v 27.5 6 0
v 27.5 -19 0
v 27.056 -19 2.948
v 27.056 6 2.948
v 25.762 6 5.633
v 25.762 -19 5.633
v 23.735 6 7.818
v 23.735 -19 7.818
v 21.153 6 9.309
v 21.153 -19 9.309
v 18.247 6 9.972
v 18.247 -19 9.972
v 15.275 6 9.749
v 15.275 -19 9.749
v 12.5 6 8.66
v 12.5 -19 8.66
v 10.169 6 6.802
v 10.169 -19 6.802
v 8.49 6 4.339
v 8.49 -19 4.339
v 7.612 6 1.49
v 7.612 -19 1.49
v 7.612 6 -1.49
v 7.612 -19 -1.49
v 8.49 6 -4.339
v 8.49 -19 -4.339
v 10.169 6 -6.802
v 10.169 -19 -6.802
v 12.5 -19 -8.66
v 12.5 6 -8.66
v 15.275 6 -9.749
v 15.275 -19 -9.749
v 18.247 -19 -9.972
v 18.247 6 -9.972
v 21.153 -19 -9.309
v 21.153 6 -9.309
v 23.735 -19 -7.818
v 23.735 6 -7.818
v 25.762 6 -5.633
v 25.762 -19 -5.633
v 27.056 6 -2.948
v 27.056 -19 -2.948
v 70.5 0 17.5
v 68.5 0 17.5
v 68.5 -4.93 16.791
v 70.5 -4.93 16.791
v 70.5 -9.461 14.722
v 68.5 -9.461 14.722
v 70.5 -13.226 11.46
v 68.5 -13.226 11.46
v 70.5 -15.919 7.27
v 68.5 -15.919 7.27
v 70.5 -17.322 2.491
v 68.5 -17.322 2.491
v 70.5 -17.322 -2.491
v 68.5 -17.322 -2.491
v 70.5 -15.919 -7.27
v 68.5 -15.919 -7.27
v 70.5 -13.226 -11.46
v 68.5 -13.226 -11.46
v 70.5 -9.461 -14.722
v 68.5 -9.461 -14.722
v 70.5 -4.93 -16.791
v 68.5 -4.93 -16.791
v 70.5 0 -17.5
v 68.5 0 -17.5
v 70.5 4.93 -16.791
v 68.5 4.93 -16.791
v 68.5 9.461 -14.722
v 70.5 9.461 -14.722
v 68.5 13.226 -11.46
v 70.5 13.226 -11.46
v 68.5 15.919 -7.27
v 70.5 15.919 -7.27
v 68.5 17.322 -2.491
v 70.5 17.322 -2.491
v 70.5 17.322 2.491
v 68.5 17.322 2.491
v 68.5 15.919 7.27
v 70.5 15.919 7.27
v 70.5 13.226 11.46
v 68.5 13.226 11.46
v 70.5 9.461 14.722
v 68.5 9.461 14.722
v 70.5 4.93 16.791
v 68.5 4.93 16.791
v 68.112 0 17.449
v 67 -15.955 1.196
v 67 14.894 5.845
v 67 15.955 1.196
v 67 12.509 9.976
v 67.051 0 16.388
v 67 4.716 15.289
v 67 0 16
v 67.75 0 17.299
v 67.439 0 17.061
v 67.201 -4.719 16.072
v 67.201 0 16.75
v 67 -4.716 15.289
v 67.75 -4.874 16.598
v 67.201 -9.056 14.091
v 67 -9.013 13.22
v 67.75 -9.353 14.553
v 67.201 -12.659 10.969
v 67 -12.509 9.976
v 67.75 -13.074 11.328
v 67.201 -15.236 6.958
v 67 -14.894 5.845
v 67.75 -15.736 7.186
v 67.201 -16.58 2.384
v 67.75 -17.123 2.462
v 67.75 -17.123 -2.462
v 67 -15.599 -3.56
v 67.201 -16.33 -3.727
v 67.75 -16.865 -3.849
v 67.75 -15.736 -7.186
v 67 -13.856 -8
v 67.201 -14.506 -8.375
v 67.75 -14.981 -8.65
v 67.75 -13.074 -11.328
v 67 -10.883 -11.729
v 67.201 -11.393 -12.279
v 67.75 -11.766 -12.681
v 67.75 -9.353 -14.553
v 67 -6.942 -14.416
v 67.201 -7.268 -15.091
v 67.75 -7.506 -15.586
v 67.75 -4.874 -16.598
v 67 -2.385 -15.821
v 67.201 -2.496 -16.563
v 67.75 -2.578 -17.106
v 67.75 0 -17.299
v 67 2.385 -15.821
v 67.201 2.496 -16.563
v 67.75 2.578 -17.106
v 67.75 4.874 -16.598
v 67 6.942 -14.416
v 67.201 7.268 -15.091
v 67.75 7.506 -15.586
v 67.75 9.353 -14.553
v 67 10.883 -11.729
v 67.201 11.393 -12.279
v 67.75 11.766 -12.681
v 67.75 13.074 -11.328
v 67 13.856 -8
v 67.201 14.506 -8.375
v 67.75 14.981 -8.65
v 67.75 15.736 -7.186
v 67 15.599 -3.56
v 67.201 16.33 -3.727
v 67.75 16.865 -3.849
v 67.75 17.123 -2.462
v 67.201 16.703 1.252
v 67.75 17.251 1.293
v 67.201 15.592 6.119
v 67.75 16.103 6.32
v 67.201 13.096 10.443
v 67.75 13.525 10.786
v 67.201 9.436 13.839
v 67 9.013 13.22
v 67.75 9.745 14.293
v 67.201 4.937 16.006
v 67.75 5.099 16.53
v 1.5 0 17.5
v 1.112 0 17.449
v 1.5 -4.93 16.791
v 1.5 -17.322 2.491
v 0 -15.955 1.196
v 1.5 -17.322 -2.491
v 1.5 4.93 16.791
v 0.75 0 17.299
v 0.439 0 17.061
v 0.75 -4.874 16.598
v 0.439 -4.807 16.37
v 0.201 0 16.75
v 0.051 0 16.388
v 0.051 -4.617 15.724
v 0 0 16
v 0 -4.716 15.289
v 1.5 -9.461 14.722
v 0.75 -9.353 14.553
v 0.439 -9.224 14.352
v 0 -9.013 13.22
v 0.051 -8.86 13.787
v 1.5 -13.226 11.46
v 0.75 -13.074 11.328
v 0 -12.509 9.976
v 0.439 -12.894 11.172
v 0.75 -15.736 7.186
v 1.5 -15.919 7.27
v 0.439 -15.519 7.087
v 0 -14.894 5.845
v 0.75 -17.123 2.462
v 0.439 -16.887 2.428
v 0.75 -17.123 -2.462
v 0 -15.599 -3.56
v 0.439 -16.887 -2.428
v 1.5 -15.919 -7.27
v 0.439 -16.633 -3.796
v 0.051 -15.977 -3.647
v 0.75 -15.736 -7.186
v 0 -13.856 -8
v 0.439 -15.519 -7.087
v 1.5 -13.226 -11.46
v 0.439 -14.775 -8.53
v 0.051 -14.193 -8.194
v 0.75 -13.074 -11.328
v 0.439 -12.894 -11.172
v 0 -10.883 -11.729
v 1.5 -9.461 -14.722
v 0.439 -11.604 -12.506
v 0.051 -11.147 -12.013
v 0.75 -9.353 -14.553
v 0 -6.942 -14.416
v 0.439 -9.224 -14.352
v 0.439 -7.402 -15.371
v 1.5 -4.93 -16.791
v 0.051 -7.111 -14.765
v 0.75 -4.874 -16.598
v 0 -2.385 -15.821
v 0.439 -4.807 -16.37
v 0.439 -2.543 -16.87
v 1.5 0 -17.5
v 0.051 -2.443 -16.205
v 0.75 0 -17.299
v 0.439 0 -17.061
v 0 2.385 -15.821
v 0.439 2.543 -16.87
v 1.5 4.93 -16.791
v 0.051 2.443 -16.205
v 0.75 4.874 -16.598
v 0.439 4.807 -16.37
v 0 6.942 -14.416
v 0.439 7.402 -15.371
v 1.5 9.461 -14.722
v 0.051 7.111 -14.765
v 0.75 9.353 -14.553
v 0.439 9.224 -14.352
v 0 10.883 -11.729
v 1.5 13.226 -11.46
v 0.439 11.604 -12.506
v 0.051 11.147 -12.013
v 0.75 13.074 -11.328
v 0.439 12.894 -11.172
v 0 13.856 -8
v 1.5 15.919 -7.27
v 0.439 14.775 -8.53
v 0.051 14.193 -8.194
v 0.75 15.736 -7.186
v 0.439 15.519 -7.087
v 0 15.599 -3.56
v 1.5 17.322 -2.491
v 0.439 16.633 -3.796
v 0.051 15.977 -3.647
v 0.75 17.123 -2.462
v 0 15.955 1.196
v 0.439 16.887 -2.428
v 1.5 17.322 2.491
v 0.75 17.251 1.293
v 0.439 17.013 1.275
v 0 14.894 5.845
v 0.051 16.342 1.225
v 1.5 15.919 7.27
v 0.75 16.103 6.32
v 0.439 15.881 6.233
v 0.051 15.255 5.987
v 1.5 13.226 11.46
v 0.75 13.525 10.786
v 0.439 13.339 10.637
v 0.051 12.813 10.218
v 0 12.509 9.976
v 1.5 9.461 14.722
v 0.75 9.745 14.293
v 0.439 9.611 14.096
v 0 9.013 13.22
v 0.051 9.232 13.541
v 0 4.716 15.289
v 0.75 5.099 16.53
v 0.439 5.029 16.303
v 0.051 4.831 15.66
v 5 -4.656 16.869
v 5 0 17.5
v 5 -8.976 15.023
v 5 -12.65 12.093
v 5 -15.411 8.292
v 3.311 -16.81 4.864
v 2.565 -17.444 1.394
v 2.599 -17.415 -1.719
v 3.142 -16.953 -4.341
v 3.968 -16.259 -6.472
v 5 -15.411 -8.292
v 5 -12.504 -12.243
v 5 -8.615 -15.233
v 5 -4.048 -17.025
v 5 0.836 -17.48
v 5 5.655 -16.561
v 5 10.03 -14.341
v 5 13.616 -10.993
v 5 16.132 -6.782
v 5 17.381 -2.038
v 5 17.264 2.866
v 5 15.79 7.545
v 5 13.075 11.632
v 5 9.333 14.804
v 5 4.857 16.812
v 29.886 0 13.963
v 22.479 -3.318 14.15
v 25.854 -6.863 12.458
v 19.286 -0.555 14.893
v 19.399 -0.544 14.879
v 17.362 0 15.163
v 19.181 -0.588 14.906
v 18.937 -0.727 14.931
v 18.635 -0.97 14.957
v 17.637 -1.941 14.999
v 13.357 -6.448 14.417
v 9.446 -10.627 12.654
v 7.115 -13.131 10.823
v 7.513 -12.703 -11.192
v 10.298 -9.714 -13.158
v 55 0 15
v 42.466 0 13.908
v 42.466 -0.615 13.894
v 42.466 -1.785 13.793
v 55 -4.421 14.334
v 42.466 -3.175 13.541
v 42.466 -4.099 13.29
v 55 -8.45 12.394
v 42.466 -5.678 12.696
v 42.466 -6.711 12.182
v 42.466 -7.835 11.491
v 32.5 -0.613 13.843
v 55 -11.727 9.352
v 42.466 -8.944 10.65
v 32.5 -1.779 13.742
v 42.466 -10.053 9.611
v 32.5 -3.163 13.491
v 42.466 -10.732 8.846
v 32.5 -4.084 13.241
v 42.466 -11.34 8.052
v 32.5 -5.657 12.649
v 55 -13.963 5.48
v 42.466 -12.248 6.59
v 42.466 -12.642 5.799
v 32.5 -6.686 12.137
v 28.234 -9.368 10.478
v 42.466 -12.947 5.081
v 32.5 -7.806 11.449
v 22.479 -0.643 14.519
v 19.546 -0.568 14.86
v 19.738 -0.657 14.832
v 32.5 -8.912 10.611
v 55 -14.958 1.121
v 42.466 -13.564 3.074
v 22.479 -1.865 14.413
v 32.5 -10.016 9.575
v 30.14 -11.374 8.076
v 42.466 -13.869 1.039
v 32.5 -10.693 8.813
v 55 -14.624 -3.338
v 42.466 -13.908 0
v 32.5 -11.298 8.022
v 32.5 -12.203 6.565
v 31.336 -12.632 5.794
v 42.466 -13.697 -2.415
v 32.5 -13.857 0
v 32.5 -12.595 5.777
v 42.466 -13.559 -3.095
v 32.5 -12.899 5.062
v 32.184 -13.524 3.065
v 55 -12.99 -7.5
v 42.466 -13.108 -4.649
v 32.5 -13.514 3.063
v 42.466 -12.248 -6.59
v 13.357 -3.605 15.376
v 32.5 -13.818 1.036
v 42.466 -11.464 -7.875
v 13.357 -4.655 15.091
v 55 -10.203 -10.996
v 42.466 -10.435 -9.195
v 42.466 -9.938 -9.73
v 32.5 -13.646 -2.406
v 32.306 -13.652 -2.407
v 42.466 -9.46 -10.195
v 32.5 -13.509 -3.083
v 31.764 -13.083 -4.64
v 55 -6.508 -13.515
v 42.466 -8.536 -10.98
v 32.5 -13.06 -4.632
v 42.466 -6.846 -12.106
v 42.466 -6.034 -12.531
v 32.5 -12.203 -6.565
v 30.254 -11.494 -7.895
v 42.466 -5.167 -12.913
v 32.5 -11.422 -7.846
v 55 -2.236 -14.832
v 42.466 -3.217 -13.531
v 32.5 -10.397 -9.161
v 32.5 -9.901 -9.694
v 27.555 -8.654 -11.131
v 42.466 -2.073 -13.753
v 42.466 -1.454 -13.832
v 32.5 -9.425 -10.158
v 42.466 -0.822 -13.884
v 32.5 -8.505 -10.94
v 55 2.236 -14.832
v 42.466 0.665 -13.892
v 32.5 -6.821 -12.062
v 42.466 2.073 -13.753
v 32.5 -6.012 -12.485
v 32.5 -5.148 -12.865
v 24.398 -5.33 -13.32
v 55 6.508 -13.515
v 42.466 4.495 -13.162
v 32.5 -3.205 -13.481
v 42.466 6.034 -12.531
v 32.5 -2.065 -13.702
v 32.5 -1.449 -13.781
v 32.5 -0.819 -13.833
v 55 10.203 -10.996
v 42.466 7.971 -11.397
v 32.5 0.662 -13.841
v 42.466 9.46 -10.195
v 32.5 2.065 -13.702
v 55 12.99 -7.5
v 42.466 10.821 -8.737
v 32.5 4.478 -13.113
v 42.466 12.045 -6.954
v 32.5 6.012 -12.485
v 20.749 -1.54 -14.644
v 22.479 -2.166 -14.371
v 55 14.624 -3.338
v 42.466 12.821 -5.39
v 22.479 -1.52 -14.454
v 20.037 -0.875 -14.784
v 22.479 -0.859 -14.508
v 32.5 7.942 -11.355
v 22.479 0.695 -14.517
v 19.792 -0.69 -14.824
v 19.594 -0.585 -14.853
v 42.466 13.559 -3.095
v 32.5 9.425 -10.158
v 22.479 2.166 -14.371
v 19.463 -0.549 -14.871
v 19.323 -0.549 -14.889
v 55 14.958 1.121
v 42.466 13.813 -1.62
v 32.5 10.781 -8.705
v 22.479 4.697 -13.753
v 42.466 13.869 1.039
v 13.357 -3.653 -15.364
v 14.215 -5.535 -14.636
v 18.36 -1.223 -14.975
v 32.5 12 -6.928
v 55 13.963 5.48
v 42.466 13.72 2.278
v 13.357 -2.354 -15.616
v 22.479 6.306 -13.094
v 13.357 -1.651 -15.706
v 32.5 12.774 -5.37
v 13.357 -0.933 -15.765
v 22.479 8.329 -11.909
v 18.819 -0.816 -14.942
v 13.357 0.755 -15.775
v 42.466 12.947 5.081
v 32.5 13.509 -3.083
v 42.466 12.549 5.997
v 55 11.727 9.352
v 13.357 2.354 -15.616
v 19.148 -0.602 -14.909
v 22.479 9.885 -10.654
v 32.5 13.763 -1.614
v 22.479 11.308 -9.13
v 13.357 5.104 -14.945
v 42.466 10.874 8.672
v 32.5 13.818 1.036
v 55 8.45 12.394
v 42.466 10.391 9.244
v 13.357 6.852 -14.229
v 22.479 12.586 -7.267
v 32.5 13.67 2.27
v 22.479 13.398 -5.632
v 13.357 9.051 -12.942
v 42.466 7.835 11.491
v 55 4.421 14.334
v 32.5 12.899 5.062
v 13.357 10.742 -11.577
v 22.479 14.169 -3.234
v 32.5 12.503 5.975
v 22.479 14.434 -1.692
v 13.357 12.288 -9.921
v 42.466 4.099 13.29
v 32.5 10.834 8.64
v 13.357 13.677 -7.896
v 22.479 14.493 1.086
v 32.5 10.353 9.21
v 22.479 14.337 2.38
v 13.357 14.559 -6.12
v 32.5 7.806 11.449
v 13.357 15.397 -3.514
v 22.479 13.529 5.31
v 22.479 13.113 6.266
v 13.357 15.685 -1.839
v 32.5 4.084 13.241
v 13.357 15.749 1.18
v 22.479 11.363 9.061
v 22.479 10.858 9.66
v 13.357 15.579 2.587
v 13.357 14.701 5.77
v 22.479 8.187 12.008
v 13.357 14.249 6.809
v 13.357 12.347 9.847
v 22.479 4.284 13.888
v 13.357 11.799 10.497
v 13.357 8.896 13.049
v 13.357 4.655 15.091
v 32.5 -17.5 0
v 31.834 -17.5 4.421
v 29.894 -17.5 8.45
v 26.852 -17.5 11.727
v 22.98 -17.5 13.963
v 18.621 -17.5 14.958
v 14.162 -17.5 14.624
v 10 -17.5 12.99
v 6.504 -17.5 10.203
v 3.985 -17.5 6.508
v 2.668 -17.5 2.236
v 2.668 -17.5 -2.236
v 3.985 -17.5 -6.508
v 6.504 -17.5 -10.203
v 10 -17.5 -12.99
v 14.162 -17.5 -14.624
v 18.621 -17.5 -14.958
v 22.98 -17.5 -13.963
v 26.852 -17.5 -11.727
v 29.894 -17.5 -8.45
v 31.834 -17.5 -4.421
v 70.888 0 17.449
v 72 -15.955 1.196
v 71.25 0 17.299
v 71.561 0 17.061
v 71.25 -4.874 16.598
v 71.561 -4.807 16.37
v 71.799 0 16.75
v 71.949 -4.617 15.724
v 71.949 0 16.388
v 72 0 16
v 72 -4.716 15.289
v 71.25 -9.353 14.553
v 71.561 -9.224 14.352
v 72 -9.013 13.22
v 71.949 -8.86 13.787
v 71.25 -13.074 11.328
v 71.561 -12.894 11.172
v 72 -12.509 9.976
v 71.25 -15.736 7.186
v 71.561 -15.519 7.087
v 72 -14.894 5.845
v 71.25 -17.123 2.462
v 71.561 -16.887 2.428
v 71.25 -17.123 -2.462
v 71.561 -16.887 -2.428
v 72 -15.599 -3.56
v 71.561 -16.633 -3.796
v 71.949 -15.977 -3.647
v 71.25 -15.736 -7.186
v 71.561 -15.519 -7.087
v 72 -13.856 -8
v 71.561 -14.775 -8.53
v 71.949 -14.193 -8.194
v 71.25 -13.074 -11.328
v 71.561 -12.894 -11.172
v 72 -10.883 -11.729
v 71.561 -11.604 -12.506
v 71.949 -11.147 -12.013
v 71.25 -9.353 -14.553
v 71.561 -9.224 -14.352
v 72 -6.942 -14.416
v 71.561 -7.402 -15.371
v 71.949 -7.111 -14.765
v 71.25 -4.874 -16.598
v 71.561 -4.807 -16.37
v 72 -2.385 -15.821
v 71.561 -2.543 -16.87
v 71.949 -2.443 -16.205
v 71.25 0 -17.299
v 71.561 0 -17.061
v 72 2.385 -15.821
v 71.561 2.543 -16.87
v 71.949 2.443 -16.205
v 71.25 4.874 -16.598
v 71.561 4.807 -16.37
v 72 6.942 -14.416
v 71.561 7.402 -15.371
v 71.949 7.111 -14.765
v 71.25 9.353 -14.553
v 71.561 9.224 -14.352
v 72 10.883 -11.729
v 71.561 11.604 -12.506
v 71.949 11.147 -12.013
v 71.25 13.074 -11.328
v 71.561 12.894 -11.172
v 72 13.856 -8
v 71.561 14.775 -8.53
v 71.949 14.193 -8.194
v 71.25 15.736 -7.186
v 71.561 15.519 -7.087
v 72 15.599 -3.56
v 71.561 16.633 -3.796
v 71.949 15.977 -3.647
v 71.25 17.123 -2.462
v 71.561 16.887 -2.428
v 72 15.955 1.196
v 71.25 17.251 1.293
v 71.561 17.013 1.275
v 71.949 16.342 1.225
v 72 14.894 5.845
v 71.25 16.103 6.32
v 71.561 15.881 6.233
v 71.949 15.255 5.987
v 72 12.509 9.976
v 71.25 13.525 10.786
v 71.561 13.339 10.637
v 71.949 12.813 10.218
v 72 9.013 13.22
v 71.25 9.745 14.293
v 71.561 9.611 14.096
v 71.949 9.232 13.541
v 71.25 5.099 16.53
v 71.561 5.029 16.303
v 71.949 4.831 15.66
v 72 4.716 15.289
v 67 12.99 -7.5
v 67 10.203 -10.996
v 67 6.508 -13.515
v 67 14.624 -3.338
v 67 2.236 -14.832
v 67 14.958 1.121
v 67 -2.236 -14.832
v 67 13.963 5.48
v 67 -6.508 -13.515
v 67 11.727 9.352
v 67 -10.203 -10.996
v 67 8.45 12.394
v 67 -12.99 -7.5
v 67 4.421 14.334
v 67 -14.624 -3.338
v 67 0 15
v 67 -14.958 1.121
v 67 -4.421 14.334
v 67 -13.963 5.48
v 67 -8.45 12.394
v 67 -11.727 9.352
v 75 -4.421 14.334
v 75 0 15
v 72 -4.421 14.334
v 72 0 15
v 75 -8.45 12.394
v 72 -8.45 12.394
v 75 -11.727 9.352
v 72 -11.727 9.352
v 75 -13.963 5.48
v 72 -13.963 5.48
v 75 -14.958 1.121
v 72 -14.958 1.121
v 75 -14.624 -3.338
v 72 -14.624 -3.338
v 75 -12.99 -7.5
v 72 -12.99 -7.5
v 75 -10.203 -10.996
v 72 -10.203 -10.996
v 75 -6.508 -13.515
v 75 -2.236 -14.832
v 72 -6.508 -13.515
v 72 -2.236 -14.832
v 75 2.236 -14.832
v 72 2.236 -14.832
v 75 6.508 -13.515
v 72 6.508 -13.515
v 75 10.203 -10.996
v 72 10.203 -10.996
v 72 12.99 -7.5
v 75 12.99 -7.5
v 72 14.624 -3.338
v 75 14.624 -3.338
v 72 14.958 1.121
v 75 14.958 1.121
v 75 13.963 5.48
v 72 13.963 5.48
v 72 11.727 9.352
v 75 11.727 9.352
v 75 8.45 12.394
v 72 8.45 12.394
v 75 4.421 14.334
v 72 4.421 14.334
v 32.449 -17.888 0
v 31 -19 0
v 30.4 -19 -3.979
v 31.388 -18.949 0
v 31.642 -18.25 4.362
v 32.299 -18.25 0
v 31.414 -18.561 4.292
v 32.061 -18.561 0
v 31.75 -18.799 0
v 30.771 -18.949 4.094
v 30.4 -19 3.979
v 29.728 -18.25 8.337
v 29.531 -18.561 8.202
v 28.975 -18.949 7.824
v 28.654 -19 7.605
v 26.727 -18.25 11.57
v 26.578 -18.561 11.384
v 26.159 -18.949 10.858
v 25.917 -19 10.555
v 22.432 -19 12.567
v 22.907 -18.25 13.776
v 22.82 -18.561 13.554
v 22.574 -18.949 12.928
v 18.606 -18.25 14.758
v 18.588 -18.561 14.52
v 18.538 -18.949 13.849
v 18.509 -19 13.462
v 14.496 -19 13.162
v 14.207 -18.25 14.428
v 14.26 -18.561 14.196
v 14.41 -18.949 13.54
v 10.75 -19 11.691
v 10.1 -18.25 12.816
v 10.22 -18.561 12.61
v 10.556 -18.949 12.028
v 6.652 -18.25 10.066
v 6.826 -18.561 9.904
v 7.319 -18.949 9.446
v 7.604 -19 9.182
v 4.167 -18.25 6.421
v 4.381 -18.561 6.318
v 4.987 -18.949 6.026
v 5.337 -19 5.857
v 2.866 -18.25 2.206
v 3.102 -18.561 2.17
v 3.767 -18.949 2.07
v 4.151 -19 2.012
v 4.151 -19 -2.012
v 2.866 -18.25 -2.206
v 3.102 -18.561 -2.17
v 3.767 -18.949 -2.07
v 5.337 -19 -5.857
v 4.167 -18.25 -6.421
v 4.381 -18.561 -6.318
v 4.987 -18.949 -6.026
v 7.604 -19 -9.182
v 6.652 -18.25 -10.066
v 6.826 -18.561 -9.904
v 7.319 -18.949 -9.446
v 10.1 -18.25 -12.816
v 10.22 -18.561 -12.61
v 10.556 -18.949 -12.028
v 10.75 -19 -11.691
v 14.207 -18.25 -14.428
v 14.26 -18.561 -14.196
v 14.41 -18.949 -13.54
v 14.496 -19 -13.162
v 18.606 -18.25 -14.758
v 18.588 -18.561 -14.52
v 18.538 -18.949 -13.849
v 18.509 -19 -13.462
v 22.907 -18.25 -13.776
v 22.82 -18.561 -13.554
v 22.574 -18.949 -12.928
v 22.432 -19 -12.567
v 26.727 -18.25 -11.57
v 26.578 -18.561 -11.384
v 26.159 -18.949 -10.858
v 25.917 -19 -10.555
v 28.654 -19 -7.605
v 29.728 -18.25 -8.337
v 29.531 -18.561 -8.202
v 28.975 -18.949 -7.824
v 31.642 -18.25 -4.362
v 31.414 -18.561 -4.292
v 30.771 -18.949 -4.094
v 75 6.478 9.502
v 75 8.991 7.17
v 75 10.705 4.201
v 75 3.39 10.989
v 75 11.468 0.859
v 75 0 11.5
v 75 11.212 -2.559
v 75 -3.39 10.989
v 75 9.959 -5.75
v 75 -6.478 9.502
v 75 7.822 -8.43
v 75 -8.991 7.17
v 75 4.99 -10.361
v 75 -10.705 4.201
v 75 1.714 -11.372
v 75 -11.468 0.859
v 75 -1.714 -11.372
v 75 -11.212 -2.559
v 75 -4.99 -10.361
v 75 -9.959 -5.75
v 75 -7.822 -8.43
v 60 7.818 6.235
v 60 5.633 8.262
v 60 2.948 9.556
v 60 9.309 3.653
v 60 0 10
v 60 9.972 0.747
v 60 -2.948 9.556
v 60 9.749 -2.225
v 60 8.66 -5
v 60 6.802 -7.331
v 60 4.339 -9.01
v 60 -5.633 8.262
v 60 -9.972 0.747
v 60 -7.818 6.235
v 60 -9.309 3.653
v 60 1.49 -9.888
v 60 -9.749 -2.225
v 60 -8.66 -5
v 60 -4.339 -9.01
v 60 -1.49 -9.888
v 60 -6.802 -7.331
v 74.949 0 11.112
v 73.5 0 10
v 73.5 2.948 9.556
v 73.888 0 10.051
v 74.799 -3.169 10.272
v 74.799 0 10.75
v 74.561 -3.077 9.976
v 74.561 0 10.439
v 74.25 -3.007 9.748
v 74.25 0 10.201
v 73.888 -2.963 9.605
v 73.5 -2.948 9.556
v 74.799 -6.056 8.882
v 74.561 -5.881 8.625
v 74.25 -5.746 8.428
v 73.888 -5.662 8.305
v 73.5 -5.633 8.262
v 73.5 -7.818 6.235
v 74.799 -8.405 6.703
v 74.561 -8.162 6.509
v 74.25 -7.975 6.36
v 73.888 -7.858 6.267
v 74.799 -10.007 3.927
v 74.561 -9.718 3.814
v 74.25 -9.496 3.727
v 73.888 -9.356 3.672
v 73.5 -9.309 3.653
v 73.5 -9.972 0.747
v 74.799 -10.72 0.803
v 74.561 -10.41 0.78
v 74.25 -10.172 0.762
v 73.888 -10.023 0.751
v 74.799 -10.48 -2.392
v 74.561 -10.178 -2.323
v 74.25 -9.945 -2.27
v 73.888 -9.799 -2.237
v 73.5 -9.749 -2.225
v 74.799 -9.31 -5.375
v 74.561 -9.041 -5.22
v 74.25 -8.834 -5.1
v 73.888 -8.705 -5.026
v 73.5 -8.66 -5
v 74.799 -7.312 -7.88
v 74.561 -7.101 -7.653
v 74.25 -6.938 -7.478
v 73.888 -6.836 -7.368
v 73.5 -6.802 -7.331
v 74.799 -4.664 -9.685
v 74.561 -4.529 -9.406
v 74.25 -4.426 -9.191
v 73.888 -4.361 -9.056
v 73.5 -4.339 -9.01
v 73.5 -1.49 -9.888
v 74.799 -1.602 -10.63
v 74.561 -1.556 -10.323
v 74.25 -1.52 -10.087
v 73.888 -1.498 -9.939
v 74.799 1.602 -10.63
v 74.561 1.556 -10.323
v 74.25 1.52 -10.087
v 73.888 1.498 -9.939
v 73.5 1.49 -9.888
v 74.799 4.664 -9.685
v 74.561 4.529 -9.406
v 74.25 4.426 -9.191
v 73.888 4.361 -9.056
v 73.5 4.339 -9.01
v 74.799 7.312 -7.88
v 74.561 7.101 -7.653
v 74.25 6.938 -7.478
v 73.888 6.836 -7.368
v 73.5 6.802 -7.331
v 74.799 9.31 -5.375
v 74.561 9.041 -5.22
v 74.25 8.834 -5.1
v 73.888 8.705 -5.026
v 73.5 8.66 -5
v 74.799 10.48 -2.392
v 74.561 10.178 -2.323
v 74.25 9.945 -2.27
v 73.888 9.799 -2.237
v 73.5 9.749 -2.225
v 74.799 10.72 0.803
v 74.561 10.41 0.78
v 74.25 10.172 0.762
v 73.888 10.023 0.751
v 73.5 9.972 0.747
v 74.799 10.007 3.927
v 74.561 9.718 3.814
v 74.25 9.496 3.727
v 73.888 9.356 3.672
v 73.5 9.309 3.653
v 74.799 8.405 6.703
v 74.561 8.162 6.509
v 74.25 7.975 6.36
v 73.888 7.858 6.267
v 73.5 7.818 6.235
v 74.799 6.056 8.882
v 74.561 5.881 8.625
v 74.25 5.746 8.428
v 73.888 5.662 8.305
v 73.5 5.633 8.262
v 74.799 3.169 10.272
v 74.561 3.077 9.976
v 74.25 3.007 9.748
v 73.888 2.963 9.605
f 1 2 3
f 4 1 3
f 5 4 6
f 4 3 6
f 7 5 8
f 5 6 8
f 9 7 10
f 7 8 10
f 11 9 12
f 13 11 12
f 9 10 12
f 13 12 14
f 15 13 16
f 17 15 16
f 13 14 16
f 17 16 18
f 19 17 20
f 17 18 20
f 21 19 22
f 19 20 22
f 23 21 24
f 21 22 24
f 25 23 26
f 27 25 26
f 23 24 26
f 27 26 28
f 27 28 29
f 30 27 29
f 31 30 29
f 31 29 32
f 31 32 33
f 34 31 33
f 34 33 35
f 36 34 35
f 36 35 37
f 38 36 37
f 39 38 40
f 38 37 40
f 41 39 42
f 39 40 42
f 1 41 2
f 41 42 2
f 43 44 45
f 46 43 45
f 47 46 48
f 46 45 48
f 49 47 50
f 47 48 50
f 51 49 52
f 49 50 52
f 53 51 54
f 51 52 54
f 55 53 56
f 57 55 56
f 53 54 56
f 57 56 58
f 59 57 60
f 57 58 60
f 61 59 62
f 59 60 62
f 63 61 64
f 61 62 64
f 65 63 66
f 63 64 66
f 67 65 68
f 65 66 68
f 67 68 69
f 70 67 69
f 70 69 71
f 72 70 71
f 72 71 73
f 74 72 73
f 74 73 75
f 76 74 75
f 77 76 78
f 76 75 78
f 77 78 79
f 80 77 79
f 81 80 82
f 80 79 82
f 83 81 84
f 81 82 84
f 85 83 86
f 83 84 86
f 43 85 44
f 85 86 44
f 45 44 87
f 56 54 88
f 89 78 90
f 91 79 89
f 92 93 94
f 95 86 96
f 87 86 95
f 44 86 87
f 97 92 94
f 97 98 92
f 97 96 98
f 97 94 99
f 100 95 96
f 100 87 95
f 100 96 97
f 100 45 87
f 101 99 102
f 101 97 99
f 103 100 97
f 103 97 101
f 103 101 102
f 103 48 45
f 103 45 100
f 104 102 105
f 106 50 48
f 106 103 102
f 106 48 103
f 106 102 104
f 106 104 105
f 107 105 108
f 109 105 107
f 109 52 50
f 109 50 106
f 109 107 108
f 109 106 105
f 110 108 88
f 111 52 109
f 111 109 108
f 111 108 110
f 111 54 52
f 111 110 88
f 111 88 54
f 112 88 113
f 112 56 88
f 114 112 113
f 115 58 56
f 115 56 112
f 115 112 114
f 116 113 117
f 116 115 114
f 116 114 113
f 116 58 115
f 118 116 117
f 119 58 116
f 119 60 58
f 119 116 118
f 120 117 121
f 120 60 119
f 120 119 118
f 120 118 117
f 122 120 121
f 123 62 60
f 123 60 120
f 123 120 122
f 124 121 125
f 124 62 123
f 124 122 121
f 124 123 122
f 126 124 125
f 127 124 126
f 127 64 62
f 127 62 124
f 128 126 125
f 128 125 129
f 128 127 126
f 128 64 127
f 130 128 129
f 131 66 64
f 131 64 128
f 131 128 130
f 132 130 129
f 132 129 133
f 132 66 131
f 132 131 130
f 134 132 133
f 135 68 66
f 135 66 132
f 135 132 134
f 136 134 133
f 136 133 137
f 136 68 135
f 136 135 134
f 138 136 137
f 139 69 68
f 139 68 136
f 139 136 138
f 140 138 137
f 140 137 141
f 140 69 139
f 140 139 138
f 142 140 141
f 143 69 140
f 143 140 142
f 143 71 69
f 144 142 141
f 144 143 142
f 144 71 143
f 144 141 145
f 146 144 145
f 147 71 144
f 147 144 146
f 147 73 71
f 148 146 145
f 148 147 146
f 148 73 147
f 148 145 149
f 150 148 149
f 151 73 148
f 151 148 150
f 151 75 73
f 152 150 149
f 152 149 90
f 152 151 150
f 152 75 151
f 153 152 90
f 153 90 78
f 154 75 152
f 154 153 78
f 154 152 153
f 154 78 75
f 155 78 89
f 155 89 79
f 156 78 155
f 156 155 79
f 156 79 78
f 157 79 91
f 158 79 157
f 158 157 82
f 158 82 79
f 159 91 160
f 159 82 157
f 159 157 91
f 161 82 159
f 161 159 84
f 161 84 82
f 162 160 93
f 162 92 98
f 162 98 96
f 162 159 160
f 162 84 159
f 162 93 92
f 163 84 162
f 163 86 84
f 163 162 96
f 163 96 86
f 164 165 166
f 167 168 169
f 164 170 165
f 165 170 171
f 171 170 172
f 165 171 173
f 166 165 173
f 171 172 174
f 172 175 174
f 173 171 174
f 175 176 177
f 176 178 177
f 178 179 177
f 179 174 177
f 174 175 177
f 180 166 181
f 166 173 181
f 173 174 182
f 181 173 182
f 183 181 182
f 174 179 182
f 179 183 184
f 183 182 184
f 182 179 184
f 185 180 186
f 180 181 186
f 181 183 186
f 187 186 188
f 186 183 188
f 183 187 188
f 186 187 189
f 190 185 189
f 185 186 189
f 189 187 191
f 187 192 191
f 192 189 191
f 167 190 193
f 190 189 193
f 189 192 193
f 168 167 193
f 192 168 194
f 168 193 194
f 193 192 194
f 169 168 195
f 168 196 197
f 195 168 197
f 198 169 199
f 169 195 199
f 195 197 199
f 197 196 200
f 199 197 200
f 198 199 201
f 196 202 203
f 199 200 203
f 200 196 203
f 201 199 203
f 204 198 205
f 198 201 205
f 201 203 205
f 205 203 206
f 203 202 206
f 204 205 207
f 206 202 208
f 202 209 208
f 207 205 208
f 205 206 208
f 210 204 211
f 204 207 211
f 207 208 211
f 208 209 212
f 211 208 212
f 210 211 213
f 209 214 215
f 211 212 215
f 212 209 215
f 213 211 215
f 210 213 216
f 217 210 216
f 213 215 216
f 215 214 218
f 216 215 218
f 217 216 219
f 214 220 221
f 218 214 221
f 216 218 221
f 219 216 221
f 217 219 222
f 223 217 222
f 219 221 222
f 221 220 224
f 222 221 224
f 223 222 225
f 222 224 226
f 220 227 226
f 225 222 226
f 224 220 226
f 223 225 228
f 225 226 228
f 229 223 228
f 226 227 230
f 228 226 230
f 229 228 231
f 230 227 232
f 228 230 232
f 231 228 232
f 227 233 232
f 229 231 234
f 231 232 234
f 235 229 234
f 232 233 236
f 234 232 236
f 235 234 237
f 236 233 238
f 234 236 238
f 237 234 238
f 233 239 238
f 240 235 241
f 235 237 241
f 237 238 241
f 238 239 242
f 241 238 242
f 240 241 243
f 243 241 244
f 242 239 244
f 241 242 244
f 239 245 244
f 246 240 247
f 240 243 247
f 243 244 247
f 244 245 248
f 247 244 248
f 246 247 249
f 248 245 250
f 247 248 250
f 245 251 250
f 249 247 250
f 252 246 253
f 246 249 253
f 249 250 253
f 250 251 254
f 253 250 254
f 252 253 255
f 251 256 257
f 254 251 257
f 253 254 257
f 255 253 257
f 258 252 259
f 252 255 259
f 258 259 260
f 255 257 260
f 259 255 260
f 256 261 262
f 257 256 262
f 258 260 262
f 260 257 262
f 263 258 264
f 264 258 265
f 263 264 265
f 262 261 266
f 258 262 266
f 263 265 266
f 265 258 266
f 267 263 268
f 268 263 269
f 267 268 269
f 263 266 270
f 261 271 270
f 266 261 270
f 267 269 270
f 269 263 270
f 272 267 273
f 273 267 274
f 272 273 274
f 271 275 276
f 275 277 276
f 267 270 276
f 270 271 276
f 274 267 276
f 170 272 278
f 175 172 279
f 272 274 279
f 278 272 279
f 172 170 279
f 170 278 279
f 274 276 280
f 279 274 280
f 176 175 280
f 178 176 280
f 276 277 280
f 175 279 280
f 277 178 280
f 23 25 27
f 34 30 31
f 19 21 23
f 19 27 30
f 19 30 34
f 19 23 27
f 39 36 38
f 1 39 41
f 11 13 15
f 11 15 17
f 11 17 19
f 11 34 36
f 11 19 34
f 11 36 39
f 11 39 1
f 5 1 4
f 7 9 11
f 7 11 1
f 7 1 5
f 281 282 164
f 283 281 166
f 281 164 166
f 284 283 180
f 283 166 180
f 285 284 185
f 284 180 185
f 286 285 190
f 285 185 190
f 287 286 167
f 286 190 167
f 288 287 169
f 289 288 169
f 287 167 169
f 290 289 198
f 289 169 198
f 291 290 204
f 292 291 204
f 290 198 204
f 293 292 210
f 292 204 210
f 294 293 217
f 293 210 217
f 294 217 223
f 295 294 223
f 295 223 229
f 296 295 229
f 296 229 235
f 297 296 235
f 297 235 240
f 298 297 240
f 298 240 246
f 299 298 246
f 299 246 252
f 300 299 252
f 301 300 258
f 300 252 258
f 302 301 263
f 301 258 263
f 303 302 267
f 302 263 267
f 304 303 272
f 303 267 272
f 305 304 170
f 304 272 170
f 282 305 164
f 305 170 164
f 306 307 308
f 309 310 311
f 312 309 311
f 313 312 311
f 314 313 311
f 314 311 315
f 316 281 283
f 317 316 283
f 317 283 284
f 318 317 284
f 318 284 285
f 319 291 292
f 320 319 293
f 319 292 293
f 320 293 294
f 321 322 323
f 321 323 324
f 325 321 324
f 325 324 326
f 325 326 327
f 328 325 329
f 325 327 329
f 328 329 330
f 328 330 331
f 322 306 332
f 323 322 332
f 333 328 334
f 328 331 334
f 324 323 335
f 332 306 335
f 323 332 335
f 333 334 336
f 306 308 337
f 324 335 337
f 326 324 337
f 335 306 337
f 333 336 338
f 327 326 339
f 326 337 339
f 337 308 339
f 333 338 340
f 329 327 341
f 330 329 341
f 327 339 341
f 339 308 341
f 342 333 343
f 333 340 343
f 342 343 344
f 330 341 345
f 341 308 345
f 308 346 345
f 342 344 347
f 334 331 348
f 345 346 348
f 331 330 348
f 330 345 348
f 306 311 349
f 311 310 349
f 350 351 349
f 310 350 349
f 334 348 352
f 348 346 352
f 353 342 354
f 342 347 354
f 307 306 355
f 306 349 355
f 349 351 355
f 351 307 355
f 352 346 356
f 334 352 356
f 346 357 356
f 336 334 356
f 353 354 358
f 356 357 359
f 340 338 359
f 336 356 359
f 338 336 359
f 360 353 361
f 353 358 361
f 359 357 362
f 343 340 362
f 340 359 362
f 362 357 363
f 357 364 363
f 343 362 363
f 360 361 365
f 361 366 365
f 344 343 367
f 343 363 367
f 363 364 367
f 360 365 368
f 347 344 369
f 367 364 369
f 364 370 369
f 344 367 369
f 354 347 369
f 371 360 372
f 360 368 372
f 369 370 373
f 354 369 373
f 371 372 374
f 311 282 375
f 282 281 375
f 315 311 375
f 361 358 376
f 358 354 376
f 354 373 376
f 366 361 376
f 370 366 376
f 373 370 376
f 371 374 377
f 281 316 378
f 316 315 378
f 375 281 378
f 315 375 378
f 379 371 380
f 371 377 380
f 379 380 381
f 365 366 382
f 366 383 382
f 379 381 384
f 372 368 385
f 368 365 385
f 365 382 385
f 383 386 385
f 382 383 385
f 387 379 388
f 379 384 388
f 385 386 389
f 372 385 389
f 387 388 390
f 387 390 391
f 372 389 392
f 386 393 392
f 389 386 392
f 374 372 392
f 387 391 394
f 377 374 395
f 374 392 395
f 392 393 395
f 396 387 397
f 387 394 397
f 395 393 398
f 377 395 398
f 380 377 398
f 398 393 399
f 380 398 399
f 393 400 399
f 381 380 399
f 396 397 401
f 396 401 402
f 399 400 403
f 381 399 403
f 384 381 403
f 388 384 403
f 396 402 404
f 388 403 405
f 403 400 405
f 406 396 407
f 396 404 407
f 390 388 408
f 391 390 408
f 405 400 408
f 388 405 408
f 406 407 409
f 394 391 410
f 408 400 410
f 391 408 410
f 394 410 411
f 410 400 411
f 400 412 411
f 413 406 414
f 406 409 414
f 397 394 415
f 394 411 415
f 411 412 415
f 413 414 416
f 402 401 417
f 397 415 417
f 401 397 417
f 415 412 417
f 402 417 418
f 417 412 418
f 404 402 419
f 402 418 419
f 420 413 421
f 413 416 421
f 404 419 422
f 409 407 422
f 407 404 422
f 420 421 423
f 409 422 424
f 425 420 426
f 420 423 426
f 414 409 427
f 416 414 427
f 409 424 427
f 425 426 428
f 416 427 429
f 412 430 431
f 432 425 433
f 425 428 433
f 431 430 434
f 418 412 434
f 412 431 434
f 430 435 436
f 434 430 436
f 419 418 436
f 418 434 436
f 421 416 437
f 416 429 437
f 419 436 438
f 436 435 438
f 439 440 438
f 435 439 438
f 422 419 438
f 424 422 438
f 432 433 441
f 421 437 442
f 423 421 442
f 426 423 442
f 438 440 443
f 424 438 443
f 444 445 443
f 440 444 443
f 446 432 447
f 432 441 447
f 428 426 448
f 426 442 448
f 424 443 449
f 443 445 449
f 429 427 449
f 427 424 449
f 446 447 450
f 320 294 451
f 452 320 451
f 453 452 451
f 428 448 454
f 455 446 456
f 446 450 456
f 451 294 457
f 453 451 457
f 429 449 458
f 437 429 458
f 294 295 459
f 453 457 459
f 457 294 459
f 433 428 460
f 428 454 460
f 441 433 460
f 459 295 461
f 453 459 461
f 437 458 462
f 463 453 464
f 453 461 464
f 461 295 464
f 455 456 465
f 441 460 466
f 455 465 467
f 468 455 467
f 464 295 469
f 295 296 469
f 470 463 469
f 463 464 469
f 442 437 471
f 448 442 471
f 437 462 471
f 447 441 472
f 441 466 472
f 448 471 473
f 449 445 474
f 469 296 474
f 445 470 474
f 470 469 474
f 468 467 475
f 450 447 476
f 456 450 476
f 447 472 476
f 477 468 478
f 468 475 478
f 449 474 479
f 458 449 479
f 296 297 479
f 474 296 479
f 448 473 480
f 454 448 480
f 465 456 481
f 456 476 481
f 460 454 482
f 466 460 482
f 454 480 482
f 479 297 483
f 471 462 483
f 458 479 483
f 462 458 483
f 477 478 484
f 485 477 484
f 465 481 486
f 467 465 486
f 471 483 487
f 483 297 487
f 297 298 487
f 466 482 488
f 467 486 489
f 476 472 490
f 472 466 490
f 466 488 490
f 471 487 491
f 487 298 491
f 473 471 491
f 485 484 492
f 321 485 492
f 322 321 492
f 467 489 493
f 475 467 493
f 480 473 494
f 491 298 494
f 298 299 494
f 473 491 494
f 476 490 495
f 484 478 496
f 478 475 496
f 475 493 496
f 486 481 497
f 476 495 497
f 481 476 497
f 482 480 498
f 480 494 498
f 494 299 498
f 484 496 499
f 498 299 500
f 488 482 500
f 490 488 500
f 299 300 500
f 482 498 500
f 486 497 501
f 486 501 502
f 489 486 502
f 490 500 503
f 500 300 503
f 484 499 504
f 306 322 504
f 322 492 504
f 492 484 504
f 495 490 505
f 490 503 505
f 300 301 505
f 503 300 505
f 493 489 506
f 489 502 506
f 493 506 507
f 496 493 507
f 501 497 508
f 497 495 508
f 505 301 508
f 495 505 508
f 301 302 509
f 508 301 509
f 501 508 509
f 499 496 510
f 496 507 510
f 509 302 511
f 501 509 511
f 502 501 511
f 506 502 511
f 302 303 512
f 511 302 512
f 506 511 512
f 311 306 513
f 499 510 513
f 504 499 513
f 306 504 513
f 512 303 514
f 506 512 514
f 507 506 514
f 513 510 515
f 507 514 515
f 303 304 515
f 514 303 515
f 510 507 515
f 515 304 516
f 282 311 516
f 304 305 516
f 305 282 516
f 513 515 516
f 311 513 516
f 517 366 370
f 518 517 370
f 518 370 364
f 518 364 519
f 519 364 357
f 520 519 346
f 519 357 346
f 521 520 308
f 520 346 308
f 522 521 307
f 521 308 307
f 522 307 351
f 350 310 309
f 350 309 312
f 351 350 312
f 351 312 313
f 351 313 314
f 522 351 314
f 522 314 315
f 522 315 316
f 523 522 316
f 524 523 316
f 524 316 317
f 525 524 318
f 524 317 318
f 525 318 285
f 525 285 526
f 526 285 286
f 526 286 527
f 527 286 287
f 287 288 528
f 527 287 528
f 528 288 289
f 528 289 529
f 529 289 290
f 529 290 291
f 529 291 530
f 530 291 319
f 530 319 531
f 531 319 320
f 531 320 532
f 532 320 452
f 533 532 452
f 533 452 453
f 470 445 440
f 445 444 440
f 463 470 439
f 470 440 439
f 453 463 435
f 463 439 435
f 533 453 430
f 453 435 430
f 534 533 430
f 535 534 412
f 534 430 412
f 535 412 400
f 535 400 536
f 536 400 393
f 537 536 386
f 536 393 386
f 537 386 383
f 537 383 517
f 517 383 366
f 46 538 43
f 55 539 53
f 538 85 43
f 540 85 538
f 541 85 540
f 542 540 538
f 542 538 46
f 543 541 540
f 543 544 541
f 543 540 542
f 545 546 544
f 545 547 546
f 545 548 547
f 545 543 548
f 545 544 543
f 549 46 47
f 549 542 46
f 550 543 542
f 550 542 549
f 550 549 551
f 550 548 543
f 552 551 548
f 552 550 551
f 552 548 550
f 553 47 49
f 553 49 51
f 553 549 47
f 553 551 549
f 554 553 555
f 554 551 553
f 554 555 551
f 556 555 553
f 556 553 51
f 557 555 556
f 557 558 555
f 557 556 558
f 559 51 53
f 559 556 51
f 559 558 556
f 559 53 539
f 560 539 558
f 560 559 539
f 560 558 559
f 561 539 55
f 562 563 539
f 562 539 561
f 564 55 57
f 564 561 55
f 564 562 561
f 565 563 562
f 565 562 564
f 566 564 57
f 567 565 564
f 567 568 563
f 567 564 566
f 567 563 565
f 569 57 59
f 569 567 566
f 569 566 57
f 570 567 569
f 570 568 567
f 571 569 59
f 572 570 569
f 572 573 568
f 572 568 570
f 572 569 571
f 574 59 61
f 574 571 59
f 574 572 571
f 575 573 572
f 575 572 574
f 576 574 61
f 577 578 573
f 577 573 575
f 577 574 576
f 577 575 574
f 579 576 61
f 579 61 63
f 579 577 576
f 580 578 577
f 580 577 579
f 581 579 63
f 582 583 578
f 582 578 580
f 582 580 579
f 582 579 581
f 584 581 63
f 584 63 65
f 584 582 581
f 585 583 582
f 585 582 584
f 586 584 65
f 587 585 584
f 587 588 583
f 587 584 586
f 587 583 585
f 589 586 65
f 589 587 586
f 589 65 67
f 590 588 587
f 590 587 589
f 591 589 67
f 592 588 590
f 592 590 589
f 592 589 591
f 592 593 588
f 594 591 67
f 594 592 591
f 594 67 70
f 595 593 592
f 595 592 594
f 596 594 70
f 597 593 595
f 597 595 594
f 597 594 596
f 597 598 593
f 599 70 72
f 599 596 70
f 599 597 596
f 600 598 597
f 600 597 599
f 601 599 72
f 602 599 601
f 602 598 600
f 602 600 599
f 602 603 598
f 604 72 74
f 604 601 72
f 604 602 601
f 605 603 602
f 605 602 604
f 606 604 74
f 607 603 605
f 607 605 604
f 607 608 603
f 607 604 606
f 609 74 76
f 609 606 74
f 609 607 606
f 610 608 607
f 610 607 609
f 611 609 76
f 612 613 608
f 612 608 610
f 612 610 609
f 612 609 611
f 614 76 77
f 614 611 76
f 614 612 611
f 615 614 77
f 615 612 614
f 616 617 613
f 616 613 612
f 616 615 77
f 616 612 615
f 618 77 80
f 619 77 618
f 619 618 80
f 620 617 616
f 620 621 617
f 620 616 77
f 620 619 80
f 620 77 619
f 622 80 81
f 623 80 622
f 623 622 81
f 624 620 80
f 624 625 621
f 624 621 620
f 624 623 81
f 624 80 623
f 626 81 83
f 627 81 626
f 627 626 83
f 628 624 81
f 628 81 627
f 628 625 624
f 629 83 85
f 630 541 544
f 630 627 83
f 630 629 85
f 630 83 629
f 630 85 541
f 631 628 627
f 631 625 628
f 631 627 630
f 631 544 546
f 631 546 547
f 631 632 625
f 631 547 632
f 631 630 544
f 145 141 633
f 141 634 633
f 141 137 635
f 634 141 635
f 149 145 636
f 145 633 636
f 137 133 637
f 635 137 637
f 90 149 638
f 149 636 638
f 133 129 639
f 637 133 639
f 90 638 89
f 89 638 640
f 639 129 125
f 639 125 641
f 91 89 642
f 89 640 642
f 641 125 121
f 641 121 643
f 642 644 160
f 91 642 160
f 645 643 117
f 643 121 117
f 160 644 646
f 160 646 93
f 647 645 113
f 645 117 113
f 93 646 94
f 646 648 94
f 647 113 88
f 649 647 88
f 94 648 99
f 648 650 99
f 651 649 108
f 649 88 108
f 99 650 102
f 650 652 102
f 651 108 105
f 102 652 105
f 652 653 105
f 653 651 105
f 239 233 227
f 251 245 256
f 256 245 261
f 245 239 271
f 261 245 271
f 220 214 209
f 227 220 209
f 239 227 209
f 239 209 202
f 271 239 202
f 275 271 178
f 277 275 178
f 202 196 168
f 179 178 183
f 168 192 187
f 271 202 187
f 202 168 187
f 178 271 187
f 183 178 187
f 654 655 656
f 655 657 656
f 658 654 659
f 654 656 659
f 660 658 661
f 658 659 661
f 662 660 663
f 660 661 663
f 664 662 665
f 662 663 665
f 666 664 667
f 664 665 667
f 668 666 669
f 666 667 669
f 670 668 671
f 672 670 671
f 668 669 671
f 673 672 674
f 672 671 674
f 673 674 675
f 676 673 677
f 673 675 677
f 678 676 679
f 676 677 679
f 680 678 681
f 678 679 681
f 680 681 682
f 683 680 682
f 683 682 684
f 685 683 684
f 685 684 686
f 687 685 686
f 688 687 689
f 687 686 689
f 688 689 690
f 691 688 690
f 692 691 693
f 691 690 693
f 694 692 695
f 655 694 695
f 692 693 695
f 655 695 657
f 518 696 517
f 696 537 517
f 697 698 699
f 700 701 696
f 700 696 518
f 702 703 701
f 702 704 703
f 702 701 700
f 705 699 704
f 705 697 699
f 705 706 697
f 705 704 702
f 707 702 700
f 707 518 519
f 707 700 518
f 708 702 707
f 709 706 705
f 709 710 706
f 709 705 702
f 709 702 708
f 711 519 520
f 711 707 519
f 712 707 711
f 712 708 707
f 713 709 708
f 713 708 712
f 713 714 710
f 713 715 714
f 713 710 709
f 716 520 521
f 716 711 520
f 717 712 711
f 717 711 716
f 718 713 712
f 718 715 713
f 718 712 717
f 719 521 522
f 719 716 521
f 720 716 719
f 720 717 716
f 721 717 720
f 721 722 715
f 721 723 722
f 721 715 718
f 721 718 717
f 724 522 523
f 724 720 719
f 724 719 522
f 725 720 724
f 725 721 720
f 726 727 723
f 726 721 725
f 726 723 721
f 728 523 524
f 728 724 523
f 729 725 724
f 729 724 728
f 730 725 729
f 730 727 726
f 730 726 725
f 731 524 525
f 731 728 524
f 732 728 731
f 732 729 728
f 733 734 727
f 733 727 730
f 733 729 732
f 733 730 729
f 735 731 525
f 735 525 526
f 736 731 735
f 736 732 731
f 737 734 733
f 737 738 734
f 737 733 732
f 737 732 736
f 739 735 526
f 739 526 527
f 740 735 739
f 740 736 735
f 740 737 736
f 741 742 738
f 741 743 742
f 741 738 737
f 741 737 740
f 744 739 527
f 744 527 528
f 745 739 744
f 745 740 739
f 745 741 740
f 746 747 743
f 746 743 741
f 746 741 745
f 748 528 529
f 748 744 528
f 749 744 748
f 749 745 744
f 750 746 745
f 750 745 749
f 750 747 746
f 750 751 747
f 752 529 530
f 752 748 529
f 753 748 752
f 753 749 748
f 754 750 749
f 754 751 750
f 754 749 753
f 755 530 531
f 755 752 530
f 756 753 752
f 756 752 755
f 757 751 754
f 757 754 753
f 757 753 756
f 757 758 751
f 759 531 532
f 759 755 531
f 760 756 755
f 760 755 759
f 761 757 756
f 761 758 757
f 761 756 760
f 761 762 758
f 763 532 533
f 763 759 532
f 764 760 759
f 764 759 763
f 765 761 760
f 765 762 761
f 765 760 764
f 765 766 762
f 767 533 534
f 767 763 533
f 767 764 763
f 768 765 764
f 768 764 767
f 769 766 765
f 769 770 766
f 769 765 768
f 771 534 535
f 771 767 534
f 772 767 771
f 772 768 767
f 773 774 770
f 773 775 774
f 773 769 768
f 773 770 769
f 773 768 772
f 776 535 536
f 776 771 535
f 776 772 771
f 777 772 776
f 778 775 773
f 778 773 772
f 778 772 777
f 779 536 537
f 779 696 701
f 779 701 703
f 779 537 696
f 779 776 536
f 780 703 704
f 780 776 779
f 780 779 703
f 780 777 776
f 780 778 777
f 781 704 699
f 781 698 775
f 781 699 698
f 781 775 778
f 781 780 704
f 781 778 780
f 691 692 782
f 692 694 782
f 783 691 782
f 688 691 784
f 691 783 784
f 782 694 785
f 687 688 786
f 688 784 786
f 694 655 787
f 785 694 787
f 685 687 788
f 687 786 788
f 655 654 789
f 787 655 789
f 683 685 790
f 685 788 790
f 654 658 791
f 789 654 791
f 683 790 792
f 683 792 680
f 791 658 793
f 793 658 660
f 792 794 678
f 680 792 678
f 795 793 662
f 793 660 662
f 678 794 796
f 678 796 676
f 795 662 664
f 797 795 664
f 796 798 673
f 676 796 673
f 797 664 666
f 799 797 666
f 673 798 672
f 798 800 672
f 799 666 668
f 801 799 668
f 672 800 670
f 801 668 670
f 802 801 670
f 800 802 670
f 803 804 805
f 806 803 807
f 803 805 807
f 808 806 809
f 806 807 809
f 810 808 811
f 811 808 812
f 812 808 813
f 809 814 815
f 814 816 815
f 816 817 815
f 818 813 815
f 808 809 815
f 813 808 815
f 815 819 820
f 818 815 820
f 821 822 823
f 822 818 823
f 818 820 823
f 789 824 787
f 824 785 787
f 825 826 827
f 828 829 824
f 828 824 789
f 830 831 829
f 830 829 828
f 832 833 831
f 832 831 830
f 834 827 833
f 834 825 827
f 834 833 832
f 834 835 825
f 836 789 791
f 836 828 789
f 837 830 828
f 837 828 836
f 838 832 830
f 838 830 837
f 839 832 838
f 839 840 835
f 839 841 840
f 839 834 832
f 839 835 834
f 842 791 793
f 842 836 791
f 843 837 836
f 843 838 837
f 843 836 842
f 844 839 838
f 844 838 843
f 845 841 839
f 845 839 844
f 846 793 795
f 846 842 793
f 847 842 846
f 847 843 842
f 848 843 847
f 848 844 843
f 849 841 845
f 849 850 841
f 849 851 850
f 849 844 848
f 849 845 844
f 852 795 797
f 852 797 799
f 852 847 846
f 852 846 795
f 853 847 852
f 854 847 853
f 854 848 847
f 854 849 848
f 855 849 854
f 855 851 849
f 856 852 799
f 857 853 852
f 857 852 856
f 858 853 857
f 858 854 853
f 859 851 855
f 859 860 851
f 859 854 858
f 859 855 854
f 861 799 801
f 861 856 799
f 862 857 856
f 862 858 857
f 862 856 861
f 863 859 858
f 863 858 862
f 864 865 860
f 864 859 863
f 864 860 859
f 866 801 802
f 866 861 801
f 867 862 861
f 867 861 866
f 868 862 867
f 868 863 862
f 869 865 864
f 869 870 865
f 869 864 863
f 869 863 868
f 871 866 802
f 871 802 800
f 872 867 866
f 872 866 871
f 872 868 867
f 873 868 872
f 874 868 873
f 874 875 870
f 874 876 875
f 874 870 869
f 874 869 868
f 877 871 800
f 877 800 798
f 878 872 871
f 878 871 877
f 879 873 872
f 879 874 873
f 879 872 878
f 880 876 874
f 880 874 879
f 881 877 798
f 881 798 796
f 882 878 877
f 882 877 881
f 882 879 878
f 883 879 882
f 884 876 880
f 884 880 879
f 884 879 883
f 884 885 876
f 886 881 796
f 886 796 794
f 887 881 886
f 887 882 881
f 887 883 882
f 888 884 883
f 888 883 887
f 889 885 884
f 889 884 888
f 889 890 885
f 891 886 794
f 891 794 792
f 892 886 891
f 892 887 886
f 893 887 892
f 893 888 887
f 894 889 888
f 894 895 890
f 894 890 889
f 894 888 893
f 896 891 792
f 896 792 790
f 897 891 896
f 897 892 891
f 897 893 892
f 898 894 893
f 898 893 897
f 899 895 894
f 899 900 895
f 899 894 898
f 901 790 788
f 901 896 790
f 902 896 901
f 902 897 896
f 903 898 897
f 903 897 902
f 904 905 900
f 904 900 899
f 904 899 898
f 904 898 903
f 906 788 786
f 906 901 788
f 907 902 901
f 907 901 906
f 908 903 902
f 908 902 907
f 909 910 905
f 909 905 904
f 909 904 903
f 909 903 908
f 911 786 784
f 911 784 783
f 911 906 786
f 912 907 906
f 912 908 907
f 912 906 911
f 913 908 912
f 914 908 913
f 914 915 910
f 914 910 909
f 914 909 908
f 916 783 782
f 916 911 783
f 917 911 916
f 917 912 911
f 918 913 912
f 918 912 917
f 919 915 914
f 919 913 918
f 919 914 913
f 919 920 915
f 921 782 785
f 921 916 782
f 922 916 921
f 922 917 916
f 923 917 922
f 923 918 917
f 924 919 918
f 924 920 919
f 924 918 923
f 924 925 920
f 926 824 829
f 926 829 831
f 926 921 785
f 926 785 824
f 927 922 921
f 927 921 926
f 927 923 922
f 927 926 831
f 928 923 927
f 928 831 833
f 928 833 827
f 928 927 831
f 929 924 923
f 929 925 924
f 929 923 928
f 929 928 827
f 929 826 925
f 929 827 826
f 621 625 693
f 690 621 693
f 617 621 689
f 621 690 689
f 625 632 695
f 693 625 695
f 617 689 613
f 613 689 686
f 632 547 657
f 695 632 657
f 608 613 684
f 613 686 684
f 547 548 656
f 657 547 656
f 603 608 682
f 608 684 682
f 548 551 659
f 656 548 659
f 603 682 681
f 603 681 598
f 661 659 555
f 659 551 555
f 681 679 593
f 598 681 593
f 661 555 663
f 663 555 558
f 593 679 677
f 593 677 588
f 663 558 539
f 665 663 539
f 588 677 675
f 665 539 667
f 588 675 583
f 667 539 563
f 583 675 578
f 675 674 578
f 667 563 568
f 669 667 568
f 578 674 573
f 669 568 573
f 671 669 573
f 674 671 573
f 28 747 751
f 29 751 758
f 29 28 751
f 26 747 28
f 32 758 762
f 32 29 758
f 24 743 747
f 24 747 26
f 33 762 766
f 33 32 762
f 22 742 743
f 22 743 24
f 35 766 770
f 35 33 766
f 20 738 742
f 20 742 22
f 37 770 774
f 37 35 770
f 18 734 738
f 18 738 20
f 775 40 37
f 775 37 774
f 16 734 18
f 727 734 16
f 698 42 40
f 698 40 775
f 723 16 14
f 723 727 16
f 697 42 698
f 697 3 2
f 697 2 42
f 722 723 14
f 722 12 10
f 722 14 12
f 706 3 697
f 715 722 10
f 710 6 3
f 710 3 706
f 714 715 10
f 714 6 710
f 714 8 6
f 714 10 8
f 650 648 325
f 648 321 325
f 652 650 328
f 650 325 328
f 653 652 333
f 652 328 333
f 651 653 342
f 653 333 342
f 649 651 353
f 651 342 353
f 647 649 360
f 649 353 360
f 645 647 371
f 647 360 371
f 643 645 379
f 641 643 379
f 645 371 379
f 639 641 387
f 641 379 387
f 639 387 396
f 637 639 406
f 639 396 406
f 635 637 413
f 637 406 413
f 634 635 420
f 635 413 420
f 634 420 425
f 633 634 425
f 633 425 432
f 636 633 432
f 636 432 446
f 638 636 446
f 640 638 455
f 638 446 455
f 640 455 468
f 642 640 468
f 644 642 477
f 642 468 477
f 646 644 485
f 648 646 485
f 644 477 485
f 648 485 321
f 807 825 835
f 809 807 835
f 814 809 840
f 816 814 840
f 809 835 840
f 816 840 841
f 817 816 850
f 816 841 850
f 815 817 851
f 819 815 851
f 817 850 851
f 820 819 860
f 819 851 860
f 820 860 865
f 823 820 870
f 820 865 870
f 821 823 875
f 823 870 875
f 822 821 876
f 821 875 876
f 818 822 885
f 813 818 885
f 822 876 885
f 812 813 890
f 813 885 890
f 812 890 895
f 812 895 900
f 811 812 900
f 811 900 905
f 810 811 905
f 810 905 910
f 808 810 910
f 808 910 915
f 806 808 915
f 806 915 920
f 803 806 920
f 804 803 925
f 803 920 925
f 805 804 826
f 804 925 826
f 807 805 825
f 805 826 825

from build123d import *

# Parameters (mm, degrees)
F2_R     = 15
F3_DEPTH = 19
F4_R     = 10
F5_DEPTH = 25
F6_R     = 1.5


with BuildPart() as f1:
    # F0 (on Front) → F1 (revolve)
    with BuildSketch(Plane.XZ):
        with BuildLine():
            Line((0, 17.5), (0, 0))
            Line((0, 0), (60, 0))
            Line((60, 0), (60, 10))
            Line((60, 10), (75, 10))
            Line((75, 10), (75, 15))
            Line((75, 15), (72, 15))
            Line((72, 15), (72, 17.5))
            Line((72, 17.5), (67, 17.5))
            Line((67, 17.5), (67, 15))
            Line((67, 15), (55, 15))
            ThreePointArc((55, 15), (29.885634, 13.962679), (5, 17.5))
            Line((5, 17.5), (0, 17.5))
        make_face()
    revolve(axis=Axis((30, 0, 0), (1, 0, 0)))

    # F2 (on Front) → F3 (join)
    with BuildSketch(Plane.XZ):
        with Locations((17.5, 0)):
            Circle(F2_R)
    extrude(amount=F3_DEPTH)

    # F4 (on face) → F5 (cut)
    with BuildSketch(Plane.XZ.offset(19)):
        with Locations((17.5, 0)):
            Circle(F4_R)
    extrude(amount=-F5_DEPTH, mode=Mode.SUBTRACT)

    # F6
    f6_edges = [f1.edges().sort_by_distance(p)[0] for p in [
        (0, 0, -17.5),
        (2.5, -19, 0),
        (75, 0, -10),
        (67, 0, -17.5),
        (72, 0, -17.5),
    ]]
    fillet(f6_edges, radius=F6_R)


solid = f1.part
